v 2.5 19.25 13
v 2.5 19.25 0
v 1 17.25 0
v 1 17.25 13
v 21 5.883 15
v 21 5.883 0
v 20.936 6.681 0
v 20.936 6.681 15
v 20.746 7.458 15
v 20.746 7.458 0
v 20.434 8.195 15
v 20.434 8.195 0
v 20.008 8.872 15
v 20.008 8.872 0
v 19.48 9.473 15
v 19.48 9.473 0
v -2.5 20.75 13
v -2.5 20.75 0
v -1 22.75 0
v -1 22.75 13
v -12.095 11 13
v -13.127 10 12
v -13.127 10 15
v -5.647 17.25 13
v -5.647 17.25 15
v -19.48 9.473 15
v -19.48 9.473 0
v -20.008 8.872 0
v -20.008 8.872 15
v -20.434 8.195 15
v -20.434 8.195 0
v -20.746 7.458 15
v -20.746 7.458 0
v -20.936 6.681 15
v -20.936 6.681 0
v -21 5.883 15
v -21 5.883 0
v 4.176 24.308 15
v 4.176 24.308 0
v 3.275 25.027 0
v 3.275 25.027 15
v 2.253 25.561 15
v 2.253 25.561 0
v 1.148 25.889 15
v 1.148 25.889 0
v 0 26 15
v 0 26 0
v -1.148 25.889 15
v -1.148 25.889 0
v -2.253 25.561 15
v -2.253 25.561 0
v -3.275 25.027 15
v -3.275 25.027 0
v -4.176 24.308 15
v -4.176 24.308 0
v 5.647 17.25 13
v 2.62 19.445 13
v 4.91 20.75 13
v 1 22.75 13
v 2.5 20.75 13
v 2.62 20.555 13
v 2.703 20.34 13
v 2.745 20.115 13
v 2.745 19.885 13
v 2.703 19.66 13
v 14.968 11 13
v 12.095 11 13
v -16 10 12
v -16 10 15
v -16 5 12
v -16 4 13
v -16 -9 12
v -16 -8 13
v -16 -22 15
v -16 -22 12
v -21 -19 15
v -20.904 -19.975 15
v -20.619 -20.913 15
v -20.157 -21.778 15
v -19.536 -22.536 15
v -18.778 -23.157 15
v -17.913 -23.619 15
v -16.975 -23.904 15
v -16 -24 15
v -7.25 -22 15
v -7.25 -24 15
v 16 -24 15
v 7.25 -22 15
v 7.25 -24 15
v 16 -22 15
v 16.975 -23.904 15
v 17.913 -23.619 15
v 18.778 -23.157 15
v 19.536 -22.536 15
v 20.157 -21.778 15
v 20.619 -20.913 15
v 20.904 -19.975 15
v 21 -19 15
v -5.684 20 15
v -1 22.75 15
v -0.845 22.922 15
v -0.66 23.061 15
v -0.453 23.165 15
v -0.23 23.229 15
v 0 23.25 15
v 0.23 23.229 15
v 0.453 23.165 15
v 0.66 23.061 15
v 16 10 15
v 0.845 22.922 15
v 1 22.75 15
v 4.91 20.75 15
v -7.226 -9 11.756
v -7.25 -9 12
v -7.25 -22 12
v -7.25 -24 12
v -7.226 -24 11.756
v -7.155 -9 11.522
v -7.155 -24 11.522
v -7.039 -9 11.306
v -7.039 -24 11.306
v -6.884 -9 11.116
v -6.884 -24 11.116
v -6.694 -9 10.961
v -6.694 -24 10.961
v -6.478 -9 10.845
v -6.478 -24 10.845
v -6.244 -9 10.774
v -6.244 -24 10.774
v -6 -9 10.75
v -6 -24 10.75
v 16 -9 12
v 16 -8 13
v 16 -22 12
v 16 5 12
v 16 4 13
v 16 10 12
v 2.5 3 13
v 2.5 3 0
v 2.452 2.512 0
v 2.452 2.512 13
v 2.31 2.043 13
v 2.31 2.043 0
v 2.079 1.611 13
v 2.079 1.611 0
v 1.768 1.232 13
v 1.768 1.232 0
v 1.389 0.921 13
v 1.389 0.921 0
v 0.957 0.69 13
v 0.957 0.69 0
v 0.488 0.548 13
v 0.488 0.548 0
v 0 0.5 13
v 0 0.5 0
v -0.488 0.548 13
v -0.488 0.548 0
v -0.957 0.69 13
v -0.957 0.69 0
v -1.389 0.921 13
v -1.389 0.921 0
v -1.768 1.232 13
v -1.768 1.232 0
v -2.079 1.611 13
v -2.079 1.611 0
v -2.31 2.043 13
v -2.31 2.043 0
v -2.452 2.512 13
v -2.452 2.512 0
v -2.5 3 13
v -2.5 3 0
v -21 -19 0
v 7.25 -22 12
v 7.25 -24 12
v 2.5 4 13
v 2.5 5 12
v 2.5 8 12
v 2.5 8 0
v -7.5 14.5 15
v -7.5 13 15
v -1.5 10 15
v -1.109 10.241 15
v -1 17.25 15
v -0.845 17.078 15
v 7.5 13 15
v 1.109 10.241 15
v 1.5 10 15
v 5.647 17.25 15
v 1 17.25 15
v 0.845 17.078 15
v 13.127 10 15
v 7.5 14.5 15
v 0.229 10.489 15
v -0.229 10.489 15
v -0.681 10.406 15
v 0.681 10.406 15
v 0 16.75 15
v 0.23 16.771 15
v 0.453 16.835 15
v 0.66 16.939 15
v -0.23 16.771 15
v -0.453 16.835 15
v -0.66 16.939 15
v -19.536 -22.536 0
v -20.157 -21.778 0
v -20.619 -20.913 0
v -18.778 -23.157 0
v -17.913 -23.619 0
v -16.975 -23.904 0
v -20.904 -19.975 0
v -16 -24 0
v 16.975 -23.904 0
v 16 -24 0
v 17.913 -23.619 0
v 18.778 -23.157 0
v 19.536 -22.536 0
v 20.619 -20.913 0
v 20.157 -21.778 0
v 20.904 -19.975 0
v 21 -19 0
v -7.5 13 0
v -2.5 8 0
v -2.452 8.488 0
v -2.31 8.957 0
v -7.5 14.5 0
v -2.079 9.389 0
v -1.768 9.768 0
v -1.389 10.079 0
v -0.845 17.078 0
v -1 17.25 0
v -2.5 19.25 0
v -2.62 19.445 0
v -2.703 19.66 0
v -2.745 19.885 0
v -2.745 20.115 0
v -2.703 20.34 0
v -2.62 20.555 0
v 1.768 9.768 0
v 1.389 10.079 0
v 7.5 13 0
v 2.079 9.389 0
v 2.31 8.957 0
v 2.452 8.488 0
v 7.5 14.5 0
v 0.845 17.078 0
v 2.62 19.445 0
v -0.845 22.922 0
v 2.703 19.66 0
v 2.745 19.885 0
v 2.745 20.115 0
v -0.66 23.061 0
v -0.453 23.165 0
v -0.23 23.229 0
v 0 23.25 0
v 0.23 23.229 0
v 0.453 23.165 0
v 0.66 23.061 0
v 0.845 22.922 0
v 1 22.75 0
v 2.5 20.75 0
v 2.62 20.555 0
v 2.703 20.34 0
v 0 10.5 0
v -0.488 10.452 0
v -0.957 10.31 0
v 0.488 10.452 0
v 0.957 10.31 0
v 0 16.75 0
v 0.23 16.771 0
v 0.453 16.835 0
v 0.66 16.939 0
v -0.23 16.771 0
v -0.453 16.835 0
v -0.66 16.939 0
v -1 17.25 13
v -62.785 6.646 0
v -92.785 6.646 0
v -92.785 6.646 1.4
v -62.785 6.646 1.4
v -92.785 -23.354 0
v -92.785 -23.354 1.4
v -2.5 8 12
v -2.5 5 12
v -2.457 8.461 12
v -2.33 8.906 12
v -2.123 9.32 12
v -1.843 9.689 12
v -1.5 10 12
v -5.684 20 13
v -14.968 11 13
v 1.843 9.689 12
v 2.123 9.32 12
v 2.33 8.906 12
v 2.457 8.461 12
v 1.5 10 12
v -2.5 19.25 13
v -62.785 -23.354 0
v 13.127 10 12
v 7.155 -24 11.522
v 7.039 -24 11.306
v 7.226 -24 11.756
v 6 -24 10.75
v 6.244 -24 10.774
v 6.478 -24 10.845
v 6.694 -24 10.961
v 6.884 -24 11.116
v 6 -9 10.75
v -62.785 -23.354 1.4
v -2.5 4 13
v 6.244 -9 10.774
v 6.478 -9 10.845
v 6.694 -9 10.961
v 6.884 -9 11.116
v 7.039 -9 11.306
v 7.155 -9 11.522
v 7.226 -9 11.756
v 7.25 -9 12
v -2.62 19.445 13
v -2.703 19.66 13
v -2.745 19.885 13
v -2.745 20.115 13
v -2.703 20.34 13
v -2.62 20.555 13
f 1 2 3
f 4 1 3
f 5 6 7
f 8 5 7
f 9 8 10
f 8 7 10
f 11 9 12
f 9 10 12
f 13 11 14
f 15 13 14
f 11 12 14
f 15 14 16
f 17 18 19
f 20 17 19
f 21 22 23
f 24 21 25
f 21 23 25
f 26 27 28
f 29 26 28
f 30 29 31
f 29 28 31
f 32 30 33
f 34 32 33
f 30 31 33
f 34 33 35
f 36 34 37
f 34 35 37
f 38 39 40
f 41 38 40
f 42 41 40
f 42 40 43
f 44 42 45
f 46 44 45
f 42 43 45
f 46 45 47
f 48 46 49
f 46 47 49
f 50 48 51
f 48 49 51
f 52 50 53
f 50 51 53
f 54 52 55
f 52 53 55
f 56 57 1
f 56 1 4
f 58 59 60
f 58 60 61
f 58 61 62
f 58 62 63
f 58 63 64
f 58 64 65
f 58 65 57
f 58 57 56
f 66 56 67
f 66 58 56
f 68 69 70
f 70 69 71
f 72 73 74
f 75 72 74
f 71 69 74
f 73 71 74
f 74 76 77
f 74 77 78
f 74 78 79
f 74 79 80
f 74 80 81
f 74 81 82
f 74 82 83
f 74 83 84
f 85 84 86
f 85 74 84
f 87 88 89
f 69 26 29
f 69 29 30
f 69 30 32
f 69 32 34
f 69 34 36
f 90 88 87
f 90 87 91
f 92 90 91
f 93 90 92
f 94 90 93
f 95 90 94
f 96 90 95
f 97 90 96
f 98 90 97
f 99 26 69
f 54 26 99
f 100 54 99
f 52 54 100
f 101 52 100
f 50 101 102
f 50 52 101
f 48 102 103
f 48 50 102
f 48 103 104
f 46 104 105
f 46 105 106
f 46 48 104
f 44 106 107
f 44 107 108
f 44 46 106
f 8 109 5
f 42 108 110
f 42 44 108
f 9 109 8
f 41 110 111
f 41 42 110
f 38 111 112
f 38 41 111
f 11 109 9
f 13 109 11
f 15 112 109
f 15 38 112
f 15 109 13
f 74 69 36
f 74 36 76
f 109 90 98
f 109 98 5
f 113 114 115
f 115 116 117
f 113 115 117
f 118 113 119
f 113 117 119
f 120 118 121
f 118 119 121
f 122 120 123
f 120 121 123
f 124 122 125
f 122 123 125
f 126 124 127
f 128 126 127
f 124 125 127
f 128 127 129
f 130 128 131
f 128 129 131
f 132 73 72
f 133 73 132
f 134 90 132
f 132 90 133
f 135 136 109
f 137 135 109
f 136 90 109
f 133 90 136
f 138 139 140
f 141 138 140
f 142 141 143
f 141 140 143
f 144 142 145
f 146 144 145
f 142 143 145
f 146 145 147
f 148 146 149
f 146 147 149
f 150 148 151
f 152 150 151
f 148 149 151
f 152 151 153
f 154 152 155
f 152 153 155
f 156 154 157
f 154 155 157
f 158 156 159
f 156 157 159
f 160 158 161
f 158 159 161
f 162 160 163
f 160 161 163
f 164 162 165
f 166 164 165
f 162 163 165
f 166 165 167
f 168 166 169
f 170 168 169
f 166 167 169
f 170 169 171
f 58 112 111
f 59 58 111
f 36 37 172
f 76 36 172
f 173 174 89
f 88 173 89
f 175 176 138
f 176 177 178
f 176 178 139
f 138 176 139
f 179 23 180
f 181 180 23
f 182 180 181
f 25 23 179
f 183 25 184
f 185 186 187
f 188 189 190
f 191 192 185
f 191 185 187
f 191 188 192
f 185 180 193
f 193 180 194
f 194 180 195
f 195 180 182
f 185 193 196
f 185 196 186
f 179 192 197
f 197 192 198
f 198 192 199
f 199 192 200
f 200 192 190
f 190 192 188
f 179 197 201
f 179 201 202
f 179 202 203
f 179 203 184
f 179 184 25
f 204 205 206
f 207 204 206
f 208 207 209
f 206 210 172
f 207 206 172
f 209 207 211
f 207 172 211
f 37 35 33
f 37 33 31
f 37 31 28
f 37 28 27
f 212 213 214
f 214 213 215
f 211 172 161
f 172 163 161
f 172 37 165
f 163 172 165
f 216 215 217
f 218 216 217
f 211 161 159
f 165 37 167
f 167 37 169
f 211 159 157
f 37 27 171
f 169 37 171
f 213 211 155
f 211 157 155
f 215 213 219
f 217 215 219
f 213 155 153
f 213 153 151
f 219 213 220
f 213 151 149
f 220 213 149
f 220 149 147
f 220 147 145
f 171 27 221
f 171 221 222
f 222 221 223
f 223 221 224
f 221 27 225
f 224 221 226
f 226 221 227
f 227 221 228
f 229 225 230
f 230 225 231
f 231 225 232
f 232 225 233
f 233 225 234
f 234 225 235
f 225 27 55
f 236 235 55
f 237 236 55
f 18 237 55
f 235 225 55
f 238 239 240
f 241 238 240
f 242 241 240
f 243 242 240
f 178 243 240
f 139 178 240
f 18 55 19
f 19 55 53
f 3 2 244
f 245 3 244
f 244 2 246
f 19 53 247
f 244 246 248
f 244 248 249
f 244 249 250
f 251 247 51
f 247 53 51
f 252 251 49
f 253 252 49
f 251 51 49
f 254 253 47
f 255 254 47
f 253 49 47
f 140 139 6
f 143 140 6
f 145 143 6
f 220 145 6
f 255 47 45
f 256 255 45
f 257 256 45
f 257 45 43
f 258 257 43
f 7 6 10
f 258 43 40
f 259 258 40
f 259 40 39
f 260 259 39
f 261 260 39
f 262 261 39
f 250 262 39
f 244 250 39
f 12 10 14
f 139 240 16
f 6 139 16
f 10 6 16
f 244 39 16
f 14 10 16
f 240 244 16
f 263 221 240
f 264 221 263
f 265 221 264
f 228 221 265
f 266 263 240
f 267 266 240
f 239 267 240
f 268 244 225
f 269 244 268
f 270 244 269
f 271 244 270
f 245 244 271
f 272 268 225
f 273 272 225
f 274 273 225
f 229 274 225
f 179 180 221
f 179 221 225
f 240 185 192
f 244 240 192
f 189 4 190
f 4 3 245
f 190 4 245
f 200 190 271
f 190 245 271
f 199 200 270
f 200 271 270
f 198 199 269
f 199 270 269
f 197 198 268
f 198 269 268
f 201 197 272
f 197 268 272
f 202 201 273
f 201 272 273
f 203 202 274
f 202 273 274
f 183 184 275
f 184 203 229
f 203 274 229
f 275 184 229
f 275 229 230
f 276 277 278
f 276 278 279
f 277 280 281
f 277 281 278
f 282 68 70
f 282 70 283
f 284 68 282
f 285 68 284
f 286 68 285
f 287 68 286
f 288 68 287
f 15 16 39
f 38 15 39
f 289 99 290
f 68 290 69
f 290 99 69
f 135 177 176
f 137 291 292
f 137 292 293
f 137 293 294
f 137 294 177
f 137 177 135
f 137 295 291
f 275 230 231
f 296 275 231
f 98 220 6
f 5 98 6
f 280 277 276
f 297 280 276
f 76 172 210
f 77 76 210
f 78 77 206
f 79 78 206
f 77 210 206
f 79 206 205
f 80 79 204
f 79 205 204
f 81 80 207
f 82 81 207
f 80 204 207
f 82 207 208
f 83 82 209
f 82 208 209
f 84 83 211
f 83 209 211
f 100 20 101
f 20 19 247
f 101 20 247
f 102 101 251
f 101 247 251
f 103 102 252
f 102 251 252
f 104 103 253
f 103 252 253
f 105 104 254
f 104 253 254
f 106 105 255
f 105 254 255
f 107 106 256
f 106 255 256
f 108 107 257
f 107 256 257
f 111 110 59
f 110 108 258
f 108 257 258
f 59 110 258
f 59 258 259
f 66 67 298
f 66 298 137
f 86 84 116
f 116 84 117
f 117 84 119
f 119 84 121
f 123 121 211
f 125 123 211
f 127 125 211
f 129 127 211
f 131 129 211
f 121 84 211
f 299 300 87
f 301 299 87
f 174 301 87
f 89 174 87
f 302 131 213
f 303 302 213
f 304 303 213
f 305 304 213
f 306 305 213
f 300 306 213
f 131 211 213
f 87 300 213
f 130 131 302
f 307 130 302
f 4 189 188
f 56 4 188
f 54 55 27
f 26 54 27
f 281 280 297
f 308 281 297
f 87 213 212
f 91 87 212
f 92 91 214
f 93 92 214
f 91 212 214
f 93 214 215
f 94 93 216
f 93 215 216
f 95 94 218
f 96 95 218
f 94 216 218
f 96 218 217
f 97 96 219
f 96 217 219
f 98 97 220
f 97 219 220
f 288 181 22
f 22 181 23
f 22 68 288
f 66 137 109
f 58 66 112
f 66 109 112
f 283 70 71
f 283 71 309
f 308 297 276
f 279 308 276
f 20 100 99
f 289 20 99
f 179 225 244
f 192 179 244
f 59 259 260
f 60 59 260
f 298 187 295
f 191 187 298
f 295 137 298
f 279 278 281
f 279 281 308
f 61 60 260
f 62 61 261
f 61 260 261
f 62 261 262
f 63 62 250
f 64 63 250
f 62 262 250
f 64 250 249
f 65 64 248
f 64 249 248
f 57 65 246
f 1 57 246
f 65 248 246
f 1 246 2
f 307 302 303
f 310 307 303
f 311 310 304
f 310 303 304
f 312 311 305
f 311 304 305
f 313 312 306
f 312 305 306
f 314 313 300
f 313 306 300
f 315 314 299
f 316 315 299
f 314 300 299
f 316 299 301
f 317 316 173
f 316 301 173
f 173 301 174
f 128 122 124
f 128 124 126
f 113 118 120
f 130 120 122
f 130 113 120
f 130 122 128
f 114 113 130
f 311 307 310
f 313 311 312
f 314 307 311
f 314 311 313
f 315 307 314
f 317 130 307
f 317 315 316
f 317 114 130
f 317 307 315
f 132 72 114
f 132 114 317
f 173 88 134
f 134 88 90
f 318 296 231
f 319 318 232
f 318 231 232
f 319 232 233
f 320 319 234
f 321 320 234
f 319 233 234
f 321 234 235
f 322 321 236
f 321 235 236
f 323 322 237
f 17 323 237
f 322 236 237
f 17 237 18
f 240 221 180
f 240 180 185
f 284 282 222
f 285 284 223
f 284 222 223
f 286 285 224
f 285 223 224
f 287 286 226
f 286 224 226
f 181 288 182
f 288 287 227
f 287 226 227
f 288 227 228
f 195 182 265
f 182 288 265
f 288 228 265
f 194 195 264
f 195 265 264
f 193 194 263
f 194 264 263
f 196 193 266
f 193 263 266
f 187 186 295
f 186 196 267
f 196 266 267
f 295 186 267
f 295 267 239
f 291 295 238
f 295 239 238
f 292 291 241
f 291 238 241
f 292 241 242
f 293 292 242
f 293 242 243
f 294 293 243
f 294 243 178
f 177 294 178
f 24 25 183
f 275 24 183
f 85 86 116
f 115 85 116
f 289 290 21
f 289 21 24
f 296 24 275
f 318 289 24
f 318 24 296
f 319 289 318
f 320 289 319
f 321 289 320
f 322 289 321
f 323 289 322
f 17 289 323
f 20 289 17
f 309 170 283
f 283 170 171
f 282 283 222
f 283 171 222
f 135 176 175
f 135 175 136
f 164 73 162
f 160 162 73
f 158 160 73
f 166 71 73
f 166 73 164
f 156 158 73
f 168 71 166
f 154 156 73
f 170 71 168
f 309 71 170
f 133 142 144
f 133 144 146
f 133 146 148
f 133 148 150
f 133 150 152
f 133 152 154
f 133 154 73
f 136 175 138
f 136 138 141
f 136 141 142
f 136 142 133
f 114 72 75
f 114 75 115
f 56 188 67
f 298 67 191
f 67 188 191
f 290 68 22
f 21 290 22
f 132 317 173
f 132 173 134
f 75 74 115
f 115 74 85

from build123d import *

# Parameters (mm, degrees)
F0_W     = 30
F0_H     = 30
F1_DEPTH = 1.4
F2_W     = 15
F2_H     = 1.5
F3_DEPTH = 15
F5_DEPTH = 2
F7_DEPTH = 15
F8_W     = 32
F8_H     = 5
F8_H_2   = 13
F9_DEPTH = 1
F10_SIZE = 0.99999


# Not quite as in the source:
# - a fillet or chamfer is up to 0.001 mm smaller than in the source, because OpenCascade refuses the exact size


with BuildPart() as f1:
    # F0 (on Top) → F1 (new body)
    with BuildSketch(Plane.XY):
        with Locations((-77.7850355953, -8.3540751795)):
            Rectangle(F0_W, F0_H)
    extrude(amount=F1_DEPTH)


with BuildPart() as f3:
    # F2 (on Top) → F3 (new body)
    with BuildSketch(Plane.XY):
        with BuildLine():
            Line((19.4800768234, 9.4733290654), (4.176092188, 24.308161329))
            ThreePointArc((4.176092188, 24.308161329), (0, 26), (-4.176092188, 24.308161329))
            Line((-4.176092188, 24.308161329), (-19.4800768234, 9.4733290654))
            ThreePointArc((-19.4800768234, 9.4733290654), (-20.6043666294, 7.8325042309), (-21, 5.8831946245))
            Line((-21, 5.8831946245), (-21, -19))
            ThreePointArc((-21, -19), (-19.5355339059, -22.5355339059), (-16, -24))
            Line((-16, -24), (16, -24))
            ThreePointArc((16, -24), (19.5355339059, -22.5355339059), (21, -19))
            Line((21, -19), (21, 5.8831946245))
            ThreePointArc((21, 5.8831946245), (20.6043666294, 7.8325042309), (19.4800768234, 9.4733290654))
        make_face()
        with BuildLine():
            ThreePointArc((-2.5, 8), (0, 10.5), (2.5, 8))
            Line((2.5, 8), (2.5, 3))
            ThreePointArc((2.5, 3), (0, 0.5), (-2.5, 3))
            Line((-2.5, 3), (-2.5, 8))
        make_face(mode=Mode.SUBTRACT)
        with Locations((0, 13.75)):
            Rectangle(F2_W, F2_H, mode=Mode.SUBTRACT)
        with BuildLine():
            ThreePointArc((-1, 22.75), (0, 23.25), (1, 22.75))
            Line((1, 22.75), (2.5, 20.75))
            ThreePointArc((2.5, 20.75), (2.75, 20), (2.5, 19.25))
            Line((2.5, 19.25), (1, 17.25))
            ThreePointArc((1, 17.25), (0, 16.75), (-1, 17.25))
            Line((-1, 17.25), (-2.5, 19.25))
            ThreePointArc((-2.5, 19.25), (-2.75, 20), (-2.5, 20.75))
            Line((-2.5, 20.75), (-1, 22.75))
        make_face(mode=Mode.SUBTRACT)
    extrude(amount=F3_DEPTH)

    # F4 (on face) → F5 (cut)
    with BuildSketch(Plane.XY.offset(15)):
        Polygon((13.1265002161, 10), (-13.1265002161, 10), (-5.6472185744, 17.25), (-1, 17.25), (-1, 22.75), (-5.6837494598, 20), (-16, 10), (-16, -22), (16, -22), (16, 10), (4.9100306693, 20.75), (1, 22.75), (1, 17.25), (5.6472185744, 17.25), align=None)
    extrude(amount=-F5_DEPTH, mode=Mode.SUBTRACT)

    # F6 (on face) → F7 (cut)
    with BuildSketch(Plane.XZ.offset(24)):
        with BuildLine():
            Line((-7.25, 15), (-7.25, 12))
            ThreePointArc((-7.25, 12), (-6.8838834765, 11.1161165235), (-6, 10.75))
            Line((-6, 10.75), (6, 10.75))
            ThreePointArc((6, 10.75), (6.8838834765, 11.1161165235), (7.25, 12))
            Line((7.25, 12), (7.25, 15))
            Line((7.25, 15), (-7.25, 15))
        make_face()
    extrude(amount=-F7_DEPTH, mode=Mode.SUBTRACT)

    # F8 (on face) → F9 (cut)
    with BuildSketch(Plane.XY.offset(13)):
        with Locations((0, 7.5)):
            Rectangle(F8_W, F8_H)
        with Locations((0, -15.5)):
            Rectangle(F8_W, F8_H_2)
    extrude(amount=-F9_DEPTH, mode=Mode.SUBTRACT)

    # F10 (size 1 in the source; OpenCascade refuses exactly that, so slightly less here)
    f10_edges = [f3.edges().sort_by_distance(p)[0] for p in [
        (-14.56325, 10, 13),
        (14.56325, 10, 13),
        (9.25, 5, 13),
        (-9.25, 5, 13),
        (0, -9, 13),
    ]]
    chamfer(f10_edges, length=F10_SIZE)


solid = Compound([f1.part, f3.part])
